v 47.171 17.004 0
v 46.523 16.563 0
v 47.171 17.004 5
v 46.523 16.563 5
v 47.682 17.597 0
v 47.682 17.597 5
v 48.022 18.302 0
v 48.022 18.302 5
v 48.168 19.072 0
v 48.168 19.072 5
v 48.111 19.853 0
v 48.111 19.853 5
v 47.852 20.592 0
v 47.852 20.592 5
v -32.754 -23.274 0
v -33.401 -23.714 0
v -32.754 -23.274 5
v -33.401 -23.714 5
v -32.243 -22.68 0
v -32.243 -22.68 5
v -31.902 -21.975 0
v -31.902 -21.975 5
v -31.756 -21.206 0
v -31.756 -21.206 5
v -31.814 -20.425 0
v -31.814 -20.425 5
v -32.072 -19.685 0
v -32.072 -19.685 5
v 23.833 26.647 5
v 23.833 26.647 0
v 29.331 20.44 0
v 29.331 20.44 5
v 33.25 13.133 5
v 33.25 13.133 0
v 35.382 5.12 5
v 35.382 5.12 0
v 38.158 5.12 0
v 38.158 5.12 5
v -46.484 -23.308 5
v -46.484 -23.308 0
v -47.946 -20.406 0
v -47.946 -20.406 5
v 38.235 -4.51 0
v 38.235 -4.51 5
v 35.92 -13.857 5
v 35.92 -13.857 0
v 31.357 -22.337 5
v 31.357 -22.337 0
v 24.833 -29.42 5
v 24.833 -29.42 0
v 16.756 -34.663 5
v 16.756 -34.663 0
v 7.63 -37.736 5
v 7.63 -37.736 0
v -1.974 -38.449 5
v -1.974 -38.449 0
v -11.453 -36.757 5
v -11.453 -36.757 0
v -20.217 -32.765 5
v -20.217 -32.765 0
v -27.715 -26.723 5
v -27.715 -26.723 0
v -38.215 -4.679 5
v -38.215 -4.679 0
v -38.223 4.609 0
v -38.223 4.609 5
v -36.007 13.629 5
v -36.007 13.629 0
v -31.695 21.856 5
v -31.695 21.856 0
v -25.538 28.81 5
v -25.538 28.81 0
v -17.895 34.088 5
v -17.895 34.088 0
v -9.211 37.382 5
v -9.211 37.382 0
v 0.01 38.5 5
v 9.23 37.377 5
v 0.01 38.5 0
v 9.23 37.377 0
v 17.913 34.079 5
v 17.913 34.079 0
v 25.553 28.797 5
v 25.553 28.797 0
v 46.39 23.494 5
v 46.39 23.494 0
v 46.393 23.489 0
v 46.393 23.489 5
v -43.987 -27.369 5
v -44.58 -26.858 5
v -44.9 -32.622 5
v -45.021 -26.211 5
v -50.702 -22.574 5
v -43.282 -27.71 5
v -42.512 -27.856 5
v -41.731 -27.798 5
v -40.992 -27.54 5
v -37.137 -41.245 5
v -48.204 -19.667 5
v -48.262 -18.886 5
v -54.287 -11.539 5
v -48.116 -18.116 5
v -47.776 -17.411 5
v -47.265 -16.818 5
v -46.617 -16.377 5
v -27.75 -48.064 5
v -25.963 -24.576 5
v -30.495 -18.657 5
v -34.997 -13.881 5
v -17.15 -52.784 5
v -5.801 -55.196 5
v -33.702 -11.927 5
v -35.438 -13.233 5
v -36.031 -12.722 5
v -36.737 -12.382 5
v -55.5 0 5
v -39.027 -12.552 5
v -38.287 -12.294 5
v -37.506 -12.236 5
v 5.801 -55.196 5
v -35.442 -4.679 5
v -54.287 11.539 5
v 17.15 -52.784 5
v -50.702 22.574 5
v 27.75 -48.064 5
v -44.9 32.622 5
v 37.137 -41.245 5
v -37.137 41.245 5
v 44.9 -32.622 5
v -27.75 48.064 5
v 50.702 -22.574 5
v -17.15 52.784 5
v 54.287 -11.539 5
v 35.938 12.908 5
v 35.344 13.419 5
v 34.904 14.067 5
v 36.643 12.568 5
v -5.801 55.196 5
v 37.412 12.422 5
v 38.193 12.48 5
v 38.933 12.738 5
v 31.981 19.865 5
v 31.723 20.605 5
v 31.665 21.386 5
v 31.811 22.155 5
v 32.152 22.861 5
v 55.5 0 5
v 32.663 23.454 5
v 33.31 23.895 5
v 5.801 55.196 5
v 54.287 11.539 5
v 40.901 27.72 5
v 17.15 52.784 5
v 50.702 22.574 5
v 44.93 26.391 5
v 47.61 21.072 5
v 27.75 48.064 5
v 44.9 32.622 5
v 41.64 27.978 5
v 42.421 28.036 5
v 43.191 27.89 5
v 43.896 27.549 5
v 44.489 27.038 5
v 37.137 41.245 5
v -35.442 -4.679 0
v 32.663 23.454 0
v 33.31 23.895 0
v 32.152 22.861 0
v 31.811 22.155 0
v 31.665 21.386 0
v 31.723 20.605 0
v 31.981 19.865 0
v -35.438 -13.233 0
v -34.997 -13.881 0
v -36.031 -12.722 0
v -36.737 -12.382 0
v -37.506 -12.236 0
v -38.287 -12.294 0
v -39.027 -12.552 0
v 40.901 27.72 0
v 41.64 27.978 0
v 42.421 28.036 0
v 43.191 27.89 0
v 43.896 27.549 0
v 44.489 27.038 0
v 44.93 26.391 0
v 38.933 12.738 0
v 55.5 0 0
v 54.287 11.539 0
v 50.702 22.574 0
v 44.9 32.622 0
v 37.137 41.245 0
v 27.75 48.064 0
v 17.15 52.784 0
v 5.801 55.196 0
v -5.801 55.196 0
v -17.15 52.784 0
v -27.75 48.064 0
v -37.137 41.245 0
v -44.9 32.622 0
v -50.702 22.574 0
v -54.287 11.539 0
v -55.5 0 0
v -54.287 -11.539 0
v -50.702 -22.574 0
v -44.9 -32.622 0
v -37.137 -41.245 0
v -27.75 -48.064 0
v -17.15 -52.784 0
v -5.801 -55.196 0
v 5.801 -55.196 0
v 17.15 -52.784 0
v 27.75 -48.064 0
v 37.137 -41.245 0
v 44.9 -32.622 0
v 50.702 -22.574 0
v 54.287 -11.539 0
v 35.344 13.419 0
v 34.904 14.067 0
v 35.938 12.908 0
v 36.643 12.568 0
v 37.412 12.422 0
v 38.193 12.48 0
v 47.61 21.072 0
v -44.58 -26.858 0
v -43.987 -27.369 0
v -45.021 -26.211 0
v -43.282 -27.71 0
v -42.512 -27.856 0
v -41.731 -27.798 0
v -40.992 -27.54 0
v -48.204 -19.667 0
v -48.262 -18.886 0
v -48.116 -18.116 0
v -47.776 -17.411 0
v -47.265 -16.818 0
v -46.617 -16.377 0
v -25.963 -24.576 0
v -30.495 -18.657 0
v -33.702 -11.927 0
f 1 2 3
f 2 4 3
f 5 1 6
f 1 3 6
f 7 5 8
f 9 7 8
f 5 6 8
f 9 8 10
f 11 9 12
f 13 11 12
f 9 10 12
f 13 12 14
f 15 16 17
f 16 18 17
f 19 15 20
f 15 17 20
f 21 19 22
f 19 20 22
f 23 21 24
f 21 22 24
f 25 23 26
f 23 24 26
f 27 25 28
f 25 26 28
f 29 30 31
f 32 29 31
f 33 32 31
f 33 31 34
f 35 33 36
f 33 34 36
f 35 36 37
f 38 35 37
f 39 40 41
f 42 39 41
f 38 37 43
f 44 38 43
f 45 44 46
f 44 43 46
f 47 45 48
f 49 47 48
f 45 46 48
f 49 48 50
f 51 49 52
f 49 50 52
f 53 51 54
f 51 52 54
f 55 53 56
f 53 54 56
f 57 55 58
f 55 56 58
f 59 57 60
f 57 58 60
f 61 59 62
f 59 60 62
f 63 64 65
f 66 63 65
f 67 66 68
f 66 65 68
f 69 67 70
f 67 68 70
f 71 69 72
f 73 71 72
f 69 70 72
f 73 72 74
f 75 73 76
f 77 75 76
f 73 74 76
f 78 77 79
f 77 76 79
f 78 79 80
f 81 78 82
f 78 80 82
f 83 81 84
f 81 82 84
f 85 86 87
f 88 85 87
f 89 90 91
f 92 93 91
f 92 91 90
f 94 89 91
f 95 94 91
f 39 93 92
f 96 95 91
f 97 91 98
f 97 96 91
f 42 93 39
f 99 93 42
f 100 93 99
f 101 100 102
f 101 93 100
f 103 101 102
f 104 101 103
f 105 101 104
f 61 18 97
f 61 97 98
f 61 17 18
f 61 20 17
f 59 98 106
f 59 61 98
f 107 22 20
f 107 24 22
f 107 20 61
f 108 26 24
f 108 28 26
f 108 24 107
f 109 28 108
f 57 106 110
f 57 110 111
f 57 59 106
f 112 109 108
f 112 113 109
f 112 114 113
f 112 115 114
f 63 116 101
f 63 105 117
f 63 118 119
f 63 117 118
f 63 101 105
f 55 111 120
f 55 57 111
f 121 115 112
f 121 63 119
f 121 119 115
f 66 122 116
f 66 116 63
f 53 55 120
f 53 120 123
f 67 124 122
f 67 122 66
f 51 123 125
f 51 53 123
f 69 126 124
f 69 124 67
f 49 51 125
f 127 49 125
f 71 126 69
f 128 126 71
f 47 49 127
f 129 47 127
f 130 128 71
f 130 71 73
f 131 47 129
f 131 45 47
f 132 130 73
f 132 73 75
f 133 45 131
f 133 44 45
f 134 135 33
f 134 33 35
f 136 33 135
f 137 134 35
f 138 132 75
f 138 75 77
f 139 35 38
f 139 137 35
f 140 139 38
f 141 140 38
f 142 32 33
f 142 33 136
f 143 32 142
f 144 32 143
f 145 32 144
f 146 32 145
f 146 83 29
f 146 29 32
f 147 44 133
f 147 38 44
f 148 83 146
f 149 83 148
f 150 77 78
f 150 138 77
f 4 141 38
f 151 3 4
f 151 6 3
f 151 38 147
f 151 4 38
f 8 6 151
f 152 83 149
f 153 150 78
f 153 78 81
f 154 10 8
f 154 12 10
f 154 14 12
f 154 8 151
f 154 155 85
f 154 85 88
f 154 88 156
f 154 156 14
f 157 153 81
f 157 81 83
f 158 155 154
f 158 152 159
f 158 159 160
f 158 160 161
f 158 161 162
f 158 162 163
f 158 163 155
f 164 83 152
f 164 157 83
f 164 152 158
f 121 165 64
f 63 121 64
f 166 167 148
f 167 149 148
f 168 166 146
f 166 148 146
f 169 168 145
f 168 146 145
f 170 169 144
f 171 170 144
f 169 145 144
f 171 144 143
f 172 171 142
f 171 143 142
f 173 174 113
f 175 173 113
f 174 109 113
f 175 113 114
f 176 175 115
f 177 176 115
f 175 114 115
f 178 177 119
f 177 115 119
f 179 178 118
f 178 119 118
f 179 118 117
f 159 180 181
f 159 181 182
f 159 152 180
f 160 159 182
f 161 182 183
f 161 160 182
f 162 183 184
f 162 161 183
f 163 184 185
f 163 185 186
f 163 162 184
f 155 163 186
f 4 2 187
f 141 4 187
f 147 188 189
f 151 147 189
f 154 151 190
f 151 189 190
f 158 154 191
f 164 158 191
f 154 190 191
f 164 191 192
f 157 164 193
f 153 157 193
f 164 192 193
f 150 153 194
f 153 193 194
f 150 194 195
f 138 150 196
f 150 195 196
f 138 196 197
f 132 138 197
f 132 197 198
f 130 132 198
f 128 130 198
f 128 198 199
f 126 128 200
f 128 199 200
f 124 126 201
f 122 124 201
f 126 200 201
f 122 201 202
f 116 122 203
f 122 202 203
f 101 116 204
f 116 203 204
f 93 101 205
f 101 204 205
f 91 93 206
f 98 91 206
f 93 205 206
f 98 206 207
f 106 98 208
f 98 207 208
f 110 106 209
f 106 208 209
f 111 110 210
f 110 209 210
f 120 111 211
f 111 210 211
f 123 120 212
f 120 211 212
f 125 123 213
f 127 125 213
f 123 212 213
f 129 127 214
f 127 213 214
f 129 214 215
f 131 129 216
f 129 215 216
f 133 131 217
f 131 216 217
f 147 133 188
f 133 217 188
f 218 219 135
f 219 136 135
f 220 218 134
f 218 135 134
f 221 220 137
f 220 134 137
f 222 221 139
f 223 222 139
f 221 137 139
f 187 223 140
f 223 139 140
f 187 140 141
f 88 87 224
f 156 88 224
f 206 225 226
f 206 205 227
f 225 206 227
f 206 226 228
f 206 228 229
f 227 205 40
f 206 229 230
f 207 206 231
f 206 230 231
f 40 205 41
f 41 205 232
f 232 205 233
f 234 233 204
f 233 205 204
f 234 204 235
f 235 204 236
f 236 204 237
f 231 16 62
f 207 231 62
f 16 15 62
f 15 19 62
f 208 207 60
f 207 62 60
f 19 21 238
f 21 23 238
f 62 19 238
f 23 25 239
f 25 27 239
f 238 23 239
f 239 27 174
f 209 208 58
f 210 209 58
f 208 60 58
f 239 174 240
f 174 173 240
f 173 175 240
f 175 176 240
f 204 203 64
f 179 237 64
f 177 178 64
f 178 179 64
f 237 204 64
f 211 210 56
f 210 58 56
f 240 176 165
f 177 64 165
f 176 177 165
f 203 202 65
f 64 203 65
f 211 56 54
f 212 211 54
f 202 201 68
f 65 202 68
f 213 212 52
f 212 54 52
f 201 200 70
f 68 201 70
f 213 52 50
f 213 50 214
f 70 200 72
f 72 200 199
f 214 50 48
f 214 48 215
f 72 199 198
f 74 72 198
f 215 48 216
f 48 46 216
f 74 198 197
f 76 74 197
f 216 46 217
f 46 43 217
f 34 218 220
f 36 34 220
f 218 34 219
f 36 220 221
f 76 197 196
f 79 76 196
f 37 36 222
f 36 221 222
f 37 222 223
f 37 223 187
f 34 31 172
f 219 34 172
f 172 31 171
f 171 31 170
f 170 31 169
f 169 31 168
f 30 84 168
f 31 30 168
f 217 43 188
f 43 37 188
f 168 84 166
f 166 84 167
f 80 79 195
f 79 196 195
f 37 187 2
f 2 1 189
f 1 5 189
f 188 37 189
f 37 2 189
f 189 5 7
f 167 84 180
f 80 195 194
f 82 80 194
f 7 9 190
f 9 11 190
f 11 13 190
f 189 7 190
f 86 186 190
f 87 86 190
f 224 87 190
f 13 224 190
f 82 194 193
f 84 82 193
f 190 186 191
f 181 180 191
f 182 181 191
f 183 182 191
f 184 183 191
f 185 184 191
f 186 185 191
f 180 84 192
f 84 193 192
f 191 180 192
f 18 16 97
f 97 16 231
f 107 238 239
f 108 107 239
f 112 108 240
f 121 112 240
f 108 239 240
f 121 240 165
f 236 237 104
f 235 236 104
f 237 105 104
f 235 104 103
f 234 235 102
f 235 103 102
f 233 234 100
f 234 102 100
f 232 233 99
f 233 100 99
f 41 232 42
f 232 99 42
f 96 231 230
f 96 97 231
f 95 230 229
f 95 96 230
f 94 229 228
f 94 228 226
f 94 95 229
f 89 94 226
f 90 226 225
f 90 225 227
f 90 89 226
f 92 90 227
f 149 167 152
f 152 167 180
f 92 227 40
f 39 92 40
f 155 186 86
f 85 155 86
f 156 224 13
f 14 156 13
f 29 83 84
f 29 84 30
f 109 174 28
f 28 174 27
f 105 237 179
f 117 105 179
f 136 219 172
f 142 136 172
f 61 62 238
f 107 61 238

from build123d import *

# Parameters (mm, degrees)
F0_R     = 55.5
F1_DEPTH = 5
F2_R     = 3


with BuildPart() as f1:
    # F0 (on Top) → F1 (new body)
    with BuildSketch(Plane.XY):
        Circle(F0_R)
        Polygon((-43.6709144021, -28.8896496715), (-46.4835835158, -23.3083064231), (-49.2962526295, -17.7269631746), (-36.3475362931, -11.2015708309), (-30.7221980657, -22.3642573278), align=None, mode=Mode.SUBTRACT)
        with BuildLine():
            ThreePointArc((-25.9631257504, -24.5759761), (-32.2743582607, -15.3762251173), (-35.4424777104, -4.6790248716))
            Line((-35.4424777104, -4.6790248716), (-38.2146140403, -4.6790248716))
            ThreePointArc((-38.2146140403, -4.6790248716), (-17.8953589694, 34.0882109733), (25.553195754, 28.797294782))
            Line((25.553195754, 28.797294782), (23.8329245146, 26.6468423848))
            ThreePointArc((23.8329245146, 26.6468423848), (31.5030749277, 16.9002594685), (35.381527976, 5.1195681537))
            Line((35.381527976, 5.1195681537), (38.1580924827, 5.1195681537))
            ThreePointArc((38.1580924827, 5.1195681537), (16.7555959393, -34.6626600929), (-27.7152221959, -26.7229575203))
            Line((-27.7152221959, -26.7229575203), (-25.9631257504, -24.5759761))
        make_face(mode=Mode.SUBTRACT)
        Polygon((43.5800816552, 29.0698943851), (46.3897934183, 23.4944195798), (46.3927507689, 23.4885511366), (47.6104286529, 21.0722419435), (49.2024625319, 17.9130763314), (36.2537461955, 11.3876839877), (30.6313653188, 22.5445020413), align=None, mode=Mode.SUBTRACT)
    extrude(amount=F1_DEPTH)

    # F2
    f2_edges = [f1.edges().sort_by_distance(p)[0] for p in [
        (-36.347536, -11.201571, 2.5),
        (-49.296253, -17.726963, 2.5),
        (-30.722198, -22.364257, 2.5),
        (-43.670914, -28.88965, 2.5),
        (36.253746, 11.387684, 2.5),
        (30.631365, 22.544502, 2.5),
        (43.580082, 29.069894, 2.5),
        (49.202463, 17.913076, 2.5),
    ]]
    fillet(f2_edges, radius=F2_R)


solid = f1.part
